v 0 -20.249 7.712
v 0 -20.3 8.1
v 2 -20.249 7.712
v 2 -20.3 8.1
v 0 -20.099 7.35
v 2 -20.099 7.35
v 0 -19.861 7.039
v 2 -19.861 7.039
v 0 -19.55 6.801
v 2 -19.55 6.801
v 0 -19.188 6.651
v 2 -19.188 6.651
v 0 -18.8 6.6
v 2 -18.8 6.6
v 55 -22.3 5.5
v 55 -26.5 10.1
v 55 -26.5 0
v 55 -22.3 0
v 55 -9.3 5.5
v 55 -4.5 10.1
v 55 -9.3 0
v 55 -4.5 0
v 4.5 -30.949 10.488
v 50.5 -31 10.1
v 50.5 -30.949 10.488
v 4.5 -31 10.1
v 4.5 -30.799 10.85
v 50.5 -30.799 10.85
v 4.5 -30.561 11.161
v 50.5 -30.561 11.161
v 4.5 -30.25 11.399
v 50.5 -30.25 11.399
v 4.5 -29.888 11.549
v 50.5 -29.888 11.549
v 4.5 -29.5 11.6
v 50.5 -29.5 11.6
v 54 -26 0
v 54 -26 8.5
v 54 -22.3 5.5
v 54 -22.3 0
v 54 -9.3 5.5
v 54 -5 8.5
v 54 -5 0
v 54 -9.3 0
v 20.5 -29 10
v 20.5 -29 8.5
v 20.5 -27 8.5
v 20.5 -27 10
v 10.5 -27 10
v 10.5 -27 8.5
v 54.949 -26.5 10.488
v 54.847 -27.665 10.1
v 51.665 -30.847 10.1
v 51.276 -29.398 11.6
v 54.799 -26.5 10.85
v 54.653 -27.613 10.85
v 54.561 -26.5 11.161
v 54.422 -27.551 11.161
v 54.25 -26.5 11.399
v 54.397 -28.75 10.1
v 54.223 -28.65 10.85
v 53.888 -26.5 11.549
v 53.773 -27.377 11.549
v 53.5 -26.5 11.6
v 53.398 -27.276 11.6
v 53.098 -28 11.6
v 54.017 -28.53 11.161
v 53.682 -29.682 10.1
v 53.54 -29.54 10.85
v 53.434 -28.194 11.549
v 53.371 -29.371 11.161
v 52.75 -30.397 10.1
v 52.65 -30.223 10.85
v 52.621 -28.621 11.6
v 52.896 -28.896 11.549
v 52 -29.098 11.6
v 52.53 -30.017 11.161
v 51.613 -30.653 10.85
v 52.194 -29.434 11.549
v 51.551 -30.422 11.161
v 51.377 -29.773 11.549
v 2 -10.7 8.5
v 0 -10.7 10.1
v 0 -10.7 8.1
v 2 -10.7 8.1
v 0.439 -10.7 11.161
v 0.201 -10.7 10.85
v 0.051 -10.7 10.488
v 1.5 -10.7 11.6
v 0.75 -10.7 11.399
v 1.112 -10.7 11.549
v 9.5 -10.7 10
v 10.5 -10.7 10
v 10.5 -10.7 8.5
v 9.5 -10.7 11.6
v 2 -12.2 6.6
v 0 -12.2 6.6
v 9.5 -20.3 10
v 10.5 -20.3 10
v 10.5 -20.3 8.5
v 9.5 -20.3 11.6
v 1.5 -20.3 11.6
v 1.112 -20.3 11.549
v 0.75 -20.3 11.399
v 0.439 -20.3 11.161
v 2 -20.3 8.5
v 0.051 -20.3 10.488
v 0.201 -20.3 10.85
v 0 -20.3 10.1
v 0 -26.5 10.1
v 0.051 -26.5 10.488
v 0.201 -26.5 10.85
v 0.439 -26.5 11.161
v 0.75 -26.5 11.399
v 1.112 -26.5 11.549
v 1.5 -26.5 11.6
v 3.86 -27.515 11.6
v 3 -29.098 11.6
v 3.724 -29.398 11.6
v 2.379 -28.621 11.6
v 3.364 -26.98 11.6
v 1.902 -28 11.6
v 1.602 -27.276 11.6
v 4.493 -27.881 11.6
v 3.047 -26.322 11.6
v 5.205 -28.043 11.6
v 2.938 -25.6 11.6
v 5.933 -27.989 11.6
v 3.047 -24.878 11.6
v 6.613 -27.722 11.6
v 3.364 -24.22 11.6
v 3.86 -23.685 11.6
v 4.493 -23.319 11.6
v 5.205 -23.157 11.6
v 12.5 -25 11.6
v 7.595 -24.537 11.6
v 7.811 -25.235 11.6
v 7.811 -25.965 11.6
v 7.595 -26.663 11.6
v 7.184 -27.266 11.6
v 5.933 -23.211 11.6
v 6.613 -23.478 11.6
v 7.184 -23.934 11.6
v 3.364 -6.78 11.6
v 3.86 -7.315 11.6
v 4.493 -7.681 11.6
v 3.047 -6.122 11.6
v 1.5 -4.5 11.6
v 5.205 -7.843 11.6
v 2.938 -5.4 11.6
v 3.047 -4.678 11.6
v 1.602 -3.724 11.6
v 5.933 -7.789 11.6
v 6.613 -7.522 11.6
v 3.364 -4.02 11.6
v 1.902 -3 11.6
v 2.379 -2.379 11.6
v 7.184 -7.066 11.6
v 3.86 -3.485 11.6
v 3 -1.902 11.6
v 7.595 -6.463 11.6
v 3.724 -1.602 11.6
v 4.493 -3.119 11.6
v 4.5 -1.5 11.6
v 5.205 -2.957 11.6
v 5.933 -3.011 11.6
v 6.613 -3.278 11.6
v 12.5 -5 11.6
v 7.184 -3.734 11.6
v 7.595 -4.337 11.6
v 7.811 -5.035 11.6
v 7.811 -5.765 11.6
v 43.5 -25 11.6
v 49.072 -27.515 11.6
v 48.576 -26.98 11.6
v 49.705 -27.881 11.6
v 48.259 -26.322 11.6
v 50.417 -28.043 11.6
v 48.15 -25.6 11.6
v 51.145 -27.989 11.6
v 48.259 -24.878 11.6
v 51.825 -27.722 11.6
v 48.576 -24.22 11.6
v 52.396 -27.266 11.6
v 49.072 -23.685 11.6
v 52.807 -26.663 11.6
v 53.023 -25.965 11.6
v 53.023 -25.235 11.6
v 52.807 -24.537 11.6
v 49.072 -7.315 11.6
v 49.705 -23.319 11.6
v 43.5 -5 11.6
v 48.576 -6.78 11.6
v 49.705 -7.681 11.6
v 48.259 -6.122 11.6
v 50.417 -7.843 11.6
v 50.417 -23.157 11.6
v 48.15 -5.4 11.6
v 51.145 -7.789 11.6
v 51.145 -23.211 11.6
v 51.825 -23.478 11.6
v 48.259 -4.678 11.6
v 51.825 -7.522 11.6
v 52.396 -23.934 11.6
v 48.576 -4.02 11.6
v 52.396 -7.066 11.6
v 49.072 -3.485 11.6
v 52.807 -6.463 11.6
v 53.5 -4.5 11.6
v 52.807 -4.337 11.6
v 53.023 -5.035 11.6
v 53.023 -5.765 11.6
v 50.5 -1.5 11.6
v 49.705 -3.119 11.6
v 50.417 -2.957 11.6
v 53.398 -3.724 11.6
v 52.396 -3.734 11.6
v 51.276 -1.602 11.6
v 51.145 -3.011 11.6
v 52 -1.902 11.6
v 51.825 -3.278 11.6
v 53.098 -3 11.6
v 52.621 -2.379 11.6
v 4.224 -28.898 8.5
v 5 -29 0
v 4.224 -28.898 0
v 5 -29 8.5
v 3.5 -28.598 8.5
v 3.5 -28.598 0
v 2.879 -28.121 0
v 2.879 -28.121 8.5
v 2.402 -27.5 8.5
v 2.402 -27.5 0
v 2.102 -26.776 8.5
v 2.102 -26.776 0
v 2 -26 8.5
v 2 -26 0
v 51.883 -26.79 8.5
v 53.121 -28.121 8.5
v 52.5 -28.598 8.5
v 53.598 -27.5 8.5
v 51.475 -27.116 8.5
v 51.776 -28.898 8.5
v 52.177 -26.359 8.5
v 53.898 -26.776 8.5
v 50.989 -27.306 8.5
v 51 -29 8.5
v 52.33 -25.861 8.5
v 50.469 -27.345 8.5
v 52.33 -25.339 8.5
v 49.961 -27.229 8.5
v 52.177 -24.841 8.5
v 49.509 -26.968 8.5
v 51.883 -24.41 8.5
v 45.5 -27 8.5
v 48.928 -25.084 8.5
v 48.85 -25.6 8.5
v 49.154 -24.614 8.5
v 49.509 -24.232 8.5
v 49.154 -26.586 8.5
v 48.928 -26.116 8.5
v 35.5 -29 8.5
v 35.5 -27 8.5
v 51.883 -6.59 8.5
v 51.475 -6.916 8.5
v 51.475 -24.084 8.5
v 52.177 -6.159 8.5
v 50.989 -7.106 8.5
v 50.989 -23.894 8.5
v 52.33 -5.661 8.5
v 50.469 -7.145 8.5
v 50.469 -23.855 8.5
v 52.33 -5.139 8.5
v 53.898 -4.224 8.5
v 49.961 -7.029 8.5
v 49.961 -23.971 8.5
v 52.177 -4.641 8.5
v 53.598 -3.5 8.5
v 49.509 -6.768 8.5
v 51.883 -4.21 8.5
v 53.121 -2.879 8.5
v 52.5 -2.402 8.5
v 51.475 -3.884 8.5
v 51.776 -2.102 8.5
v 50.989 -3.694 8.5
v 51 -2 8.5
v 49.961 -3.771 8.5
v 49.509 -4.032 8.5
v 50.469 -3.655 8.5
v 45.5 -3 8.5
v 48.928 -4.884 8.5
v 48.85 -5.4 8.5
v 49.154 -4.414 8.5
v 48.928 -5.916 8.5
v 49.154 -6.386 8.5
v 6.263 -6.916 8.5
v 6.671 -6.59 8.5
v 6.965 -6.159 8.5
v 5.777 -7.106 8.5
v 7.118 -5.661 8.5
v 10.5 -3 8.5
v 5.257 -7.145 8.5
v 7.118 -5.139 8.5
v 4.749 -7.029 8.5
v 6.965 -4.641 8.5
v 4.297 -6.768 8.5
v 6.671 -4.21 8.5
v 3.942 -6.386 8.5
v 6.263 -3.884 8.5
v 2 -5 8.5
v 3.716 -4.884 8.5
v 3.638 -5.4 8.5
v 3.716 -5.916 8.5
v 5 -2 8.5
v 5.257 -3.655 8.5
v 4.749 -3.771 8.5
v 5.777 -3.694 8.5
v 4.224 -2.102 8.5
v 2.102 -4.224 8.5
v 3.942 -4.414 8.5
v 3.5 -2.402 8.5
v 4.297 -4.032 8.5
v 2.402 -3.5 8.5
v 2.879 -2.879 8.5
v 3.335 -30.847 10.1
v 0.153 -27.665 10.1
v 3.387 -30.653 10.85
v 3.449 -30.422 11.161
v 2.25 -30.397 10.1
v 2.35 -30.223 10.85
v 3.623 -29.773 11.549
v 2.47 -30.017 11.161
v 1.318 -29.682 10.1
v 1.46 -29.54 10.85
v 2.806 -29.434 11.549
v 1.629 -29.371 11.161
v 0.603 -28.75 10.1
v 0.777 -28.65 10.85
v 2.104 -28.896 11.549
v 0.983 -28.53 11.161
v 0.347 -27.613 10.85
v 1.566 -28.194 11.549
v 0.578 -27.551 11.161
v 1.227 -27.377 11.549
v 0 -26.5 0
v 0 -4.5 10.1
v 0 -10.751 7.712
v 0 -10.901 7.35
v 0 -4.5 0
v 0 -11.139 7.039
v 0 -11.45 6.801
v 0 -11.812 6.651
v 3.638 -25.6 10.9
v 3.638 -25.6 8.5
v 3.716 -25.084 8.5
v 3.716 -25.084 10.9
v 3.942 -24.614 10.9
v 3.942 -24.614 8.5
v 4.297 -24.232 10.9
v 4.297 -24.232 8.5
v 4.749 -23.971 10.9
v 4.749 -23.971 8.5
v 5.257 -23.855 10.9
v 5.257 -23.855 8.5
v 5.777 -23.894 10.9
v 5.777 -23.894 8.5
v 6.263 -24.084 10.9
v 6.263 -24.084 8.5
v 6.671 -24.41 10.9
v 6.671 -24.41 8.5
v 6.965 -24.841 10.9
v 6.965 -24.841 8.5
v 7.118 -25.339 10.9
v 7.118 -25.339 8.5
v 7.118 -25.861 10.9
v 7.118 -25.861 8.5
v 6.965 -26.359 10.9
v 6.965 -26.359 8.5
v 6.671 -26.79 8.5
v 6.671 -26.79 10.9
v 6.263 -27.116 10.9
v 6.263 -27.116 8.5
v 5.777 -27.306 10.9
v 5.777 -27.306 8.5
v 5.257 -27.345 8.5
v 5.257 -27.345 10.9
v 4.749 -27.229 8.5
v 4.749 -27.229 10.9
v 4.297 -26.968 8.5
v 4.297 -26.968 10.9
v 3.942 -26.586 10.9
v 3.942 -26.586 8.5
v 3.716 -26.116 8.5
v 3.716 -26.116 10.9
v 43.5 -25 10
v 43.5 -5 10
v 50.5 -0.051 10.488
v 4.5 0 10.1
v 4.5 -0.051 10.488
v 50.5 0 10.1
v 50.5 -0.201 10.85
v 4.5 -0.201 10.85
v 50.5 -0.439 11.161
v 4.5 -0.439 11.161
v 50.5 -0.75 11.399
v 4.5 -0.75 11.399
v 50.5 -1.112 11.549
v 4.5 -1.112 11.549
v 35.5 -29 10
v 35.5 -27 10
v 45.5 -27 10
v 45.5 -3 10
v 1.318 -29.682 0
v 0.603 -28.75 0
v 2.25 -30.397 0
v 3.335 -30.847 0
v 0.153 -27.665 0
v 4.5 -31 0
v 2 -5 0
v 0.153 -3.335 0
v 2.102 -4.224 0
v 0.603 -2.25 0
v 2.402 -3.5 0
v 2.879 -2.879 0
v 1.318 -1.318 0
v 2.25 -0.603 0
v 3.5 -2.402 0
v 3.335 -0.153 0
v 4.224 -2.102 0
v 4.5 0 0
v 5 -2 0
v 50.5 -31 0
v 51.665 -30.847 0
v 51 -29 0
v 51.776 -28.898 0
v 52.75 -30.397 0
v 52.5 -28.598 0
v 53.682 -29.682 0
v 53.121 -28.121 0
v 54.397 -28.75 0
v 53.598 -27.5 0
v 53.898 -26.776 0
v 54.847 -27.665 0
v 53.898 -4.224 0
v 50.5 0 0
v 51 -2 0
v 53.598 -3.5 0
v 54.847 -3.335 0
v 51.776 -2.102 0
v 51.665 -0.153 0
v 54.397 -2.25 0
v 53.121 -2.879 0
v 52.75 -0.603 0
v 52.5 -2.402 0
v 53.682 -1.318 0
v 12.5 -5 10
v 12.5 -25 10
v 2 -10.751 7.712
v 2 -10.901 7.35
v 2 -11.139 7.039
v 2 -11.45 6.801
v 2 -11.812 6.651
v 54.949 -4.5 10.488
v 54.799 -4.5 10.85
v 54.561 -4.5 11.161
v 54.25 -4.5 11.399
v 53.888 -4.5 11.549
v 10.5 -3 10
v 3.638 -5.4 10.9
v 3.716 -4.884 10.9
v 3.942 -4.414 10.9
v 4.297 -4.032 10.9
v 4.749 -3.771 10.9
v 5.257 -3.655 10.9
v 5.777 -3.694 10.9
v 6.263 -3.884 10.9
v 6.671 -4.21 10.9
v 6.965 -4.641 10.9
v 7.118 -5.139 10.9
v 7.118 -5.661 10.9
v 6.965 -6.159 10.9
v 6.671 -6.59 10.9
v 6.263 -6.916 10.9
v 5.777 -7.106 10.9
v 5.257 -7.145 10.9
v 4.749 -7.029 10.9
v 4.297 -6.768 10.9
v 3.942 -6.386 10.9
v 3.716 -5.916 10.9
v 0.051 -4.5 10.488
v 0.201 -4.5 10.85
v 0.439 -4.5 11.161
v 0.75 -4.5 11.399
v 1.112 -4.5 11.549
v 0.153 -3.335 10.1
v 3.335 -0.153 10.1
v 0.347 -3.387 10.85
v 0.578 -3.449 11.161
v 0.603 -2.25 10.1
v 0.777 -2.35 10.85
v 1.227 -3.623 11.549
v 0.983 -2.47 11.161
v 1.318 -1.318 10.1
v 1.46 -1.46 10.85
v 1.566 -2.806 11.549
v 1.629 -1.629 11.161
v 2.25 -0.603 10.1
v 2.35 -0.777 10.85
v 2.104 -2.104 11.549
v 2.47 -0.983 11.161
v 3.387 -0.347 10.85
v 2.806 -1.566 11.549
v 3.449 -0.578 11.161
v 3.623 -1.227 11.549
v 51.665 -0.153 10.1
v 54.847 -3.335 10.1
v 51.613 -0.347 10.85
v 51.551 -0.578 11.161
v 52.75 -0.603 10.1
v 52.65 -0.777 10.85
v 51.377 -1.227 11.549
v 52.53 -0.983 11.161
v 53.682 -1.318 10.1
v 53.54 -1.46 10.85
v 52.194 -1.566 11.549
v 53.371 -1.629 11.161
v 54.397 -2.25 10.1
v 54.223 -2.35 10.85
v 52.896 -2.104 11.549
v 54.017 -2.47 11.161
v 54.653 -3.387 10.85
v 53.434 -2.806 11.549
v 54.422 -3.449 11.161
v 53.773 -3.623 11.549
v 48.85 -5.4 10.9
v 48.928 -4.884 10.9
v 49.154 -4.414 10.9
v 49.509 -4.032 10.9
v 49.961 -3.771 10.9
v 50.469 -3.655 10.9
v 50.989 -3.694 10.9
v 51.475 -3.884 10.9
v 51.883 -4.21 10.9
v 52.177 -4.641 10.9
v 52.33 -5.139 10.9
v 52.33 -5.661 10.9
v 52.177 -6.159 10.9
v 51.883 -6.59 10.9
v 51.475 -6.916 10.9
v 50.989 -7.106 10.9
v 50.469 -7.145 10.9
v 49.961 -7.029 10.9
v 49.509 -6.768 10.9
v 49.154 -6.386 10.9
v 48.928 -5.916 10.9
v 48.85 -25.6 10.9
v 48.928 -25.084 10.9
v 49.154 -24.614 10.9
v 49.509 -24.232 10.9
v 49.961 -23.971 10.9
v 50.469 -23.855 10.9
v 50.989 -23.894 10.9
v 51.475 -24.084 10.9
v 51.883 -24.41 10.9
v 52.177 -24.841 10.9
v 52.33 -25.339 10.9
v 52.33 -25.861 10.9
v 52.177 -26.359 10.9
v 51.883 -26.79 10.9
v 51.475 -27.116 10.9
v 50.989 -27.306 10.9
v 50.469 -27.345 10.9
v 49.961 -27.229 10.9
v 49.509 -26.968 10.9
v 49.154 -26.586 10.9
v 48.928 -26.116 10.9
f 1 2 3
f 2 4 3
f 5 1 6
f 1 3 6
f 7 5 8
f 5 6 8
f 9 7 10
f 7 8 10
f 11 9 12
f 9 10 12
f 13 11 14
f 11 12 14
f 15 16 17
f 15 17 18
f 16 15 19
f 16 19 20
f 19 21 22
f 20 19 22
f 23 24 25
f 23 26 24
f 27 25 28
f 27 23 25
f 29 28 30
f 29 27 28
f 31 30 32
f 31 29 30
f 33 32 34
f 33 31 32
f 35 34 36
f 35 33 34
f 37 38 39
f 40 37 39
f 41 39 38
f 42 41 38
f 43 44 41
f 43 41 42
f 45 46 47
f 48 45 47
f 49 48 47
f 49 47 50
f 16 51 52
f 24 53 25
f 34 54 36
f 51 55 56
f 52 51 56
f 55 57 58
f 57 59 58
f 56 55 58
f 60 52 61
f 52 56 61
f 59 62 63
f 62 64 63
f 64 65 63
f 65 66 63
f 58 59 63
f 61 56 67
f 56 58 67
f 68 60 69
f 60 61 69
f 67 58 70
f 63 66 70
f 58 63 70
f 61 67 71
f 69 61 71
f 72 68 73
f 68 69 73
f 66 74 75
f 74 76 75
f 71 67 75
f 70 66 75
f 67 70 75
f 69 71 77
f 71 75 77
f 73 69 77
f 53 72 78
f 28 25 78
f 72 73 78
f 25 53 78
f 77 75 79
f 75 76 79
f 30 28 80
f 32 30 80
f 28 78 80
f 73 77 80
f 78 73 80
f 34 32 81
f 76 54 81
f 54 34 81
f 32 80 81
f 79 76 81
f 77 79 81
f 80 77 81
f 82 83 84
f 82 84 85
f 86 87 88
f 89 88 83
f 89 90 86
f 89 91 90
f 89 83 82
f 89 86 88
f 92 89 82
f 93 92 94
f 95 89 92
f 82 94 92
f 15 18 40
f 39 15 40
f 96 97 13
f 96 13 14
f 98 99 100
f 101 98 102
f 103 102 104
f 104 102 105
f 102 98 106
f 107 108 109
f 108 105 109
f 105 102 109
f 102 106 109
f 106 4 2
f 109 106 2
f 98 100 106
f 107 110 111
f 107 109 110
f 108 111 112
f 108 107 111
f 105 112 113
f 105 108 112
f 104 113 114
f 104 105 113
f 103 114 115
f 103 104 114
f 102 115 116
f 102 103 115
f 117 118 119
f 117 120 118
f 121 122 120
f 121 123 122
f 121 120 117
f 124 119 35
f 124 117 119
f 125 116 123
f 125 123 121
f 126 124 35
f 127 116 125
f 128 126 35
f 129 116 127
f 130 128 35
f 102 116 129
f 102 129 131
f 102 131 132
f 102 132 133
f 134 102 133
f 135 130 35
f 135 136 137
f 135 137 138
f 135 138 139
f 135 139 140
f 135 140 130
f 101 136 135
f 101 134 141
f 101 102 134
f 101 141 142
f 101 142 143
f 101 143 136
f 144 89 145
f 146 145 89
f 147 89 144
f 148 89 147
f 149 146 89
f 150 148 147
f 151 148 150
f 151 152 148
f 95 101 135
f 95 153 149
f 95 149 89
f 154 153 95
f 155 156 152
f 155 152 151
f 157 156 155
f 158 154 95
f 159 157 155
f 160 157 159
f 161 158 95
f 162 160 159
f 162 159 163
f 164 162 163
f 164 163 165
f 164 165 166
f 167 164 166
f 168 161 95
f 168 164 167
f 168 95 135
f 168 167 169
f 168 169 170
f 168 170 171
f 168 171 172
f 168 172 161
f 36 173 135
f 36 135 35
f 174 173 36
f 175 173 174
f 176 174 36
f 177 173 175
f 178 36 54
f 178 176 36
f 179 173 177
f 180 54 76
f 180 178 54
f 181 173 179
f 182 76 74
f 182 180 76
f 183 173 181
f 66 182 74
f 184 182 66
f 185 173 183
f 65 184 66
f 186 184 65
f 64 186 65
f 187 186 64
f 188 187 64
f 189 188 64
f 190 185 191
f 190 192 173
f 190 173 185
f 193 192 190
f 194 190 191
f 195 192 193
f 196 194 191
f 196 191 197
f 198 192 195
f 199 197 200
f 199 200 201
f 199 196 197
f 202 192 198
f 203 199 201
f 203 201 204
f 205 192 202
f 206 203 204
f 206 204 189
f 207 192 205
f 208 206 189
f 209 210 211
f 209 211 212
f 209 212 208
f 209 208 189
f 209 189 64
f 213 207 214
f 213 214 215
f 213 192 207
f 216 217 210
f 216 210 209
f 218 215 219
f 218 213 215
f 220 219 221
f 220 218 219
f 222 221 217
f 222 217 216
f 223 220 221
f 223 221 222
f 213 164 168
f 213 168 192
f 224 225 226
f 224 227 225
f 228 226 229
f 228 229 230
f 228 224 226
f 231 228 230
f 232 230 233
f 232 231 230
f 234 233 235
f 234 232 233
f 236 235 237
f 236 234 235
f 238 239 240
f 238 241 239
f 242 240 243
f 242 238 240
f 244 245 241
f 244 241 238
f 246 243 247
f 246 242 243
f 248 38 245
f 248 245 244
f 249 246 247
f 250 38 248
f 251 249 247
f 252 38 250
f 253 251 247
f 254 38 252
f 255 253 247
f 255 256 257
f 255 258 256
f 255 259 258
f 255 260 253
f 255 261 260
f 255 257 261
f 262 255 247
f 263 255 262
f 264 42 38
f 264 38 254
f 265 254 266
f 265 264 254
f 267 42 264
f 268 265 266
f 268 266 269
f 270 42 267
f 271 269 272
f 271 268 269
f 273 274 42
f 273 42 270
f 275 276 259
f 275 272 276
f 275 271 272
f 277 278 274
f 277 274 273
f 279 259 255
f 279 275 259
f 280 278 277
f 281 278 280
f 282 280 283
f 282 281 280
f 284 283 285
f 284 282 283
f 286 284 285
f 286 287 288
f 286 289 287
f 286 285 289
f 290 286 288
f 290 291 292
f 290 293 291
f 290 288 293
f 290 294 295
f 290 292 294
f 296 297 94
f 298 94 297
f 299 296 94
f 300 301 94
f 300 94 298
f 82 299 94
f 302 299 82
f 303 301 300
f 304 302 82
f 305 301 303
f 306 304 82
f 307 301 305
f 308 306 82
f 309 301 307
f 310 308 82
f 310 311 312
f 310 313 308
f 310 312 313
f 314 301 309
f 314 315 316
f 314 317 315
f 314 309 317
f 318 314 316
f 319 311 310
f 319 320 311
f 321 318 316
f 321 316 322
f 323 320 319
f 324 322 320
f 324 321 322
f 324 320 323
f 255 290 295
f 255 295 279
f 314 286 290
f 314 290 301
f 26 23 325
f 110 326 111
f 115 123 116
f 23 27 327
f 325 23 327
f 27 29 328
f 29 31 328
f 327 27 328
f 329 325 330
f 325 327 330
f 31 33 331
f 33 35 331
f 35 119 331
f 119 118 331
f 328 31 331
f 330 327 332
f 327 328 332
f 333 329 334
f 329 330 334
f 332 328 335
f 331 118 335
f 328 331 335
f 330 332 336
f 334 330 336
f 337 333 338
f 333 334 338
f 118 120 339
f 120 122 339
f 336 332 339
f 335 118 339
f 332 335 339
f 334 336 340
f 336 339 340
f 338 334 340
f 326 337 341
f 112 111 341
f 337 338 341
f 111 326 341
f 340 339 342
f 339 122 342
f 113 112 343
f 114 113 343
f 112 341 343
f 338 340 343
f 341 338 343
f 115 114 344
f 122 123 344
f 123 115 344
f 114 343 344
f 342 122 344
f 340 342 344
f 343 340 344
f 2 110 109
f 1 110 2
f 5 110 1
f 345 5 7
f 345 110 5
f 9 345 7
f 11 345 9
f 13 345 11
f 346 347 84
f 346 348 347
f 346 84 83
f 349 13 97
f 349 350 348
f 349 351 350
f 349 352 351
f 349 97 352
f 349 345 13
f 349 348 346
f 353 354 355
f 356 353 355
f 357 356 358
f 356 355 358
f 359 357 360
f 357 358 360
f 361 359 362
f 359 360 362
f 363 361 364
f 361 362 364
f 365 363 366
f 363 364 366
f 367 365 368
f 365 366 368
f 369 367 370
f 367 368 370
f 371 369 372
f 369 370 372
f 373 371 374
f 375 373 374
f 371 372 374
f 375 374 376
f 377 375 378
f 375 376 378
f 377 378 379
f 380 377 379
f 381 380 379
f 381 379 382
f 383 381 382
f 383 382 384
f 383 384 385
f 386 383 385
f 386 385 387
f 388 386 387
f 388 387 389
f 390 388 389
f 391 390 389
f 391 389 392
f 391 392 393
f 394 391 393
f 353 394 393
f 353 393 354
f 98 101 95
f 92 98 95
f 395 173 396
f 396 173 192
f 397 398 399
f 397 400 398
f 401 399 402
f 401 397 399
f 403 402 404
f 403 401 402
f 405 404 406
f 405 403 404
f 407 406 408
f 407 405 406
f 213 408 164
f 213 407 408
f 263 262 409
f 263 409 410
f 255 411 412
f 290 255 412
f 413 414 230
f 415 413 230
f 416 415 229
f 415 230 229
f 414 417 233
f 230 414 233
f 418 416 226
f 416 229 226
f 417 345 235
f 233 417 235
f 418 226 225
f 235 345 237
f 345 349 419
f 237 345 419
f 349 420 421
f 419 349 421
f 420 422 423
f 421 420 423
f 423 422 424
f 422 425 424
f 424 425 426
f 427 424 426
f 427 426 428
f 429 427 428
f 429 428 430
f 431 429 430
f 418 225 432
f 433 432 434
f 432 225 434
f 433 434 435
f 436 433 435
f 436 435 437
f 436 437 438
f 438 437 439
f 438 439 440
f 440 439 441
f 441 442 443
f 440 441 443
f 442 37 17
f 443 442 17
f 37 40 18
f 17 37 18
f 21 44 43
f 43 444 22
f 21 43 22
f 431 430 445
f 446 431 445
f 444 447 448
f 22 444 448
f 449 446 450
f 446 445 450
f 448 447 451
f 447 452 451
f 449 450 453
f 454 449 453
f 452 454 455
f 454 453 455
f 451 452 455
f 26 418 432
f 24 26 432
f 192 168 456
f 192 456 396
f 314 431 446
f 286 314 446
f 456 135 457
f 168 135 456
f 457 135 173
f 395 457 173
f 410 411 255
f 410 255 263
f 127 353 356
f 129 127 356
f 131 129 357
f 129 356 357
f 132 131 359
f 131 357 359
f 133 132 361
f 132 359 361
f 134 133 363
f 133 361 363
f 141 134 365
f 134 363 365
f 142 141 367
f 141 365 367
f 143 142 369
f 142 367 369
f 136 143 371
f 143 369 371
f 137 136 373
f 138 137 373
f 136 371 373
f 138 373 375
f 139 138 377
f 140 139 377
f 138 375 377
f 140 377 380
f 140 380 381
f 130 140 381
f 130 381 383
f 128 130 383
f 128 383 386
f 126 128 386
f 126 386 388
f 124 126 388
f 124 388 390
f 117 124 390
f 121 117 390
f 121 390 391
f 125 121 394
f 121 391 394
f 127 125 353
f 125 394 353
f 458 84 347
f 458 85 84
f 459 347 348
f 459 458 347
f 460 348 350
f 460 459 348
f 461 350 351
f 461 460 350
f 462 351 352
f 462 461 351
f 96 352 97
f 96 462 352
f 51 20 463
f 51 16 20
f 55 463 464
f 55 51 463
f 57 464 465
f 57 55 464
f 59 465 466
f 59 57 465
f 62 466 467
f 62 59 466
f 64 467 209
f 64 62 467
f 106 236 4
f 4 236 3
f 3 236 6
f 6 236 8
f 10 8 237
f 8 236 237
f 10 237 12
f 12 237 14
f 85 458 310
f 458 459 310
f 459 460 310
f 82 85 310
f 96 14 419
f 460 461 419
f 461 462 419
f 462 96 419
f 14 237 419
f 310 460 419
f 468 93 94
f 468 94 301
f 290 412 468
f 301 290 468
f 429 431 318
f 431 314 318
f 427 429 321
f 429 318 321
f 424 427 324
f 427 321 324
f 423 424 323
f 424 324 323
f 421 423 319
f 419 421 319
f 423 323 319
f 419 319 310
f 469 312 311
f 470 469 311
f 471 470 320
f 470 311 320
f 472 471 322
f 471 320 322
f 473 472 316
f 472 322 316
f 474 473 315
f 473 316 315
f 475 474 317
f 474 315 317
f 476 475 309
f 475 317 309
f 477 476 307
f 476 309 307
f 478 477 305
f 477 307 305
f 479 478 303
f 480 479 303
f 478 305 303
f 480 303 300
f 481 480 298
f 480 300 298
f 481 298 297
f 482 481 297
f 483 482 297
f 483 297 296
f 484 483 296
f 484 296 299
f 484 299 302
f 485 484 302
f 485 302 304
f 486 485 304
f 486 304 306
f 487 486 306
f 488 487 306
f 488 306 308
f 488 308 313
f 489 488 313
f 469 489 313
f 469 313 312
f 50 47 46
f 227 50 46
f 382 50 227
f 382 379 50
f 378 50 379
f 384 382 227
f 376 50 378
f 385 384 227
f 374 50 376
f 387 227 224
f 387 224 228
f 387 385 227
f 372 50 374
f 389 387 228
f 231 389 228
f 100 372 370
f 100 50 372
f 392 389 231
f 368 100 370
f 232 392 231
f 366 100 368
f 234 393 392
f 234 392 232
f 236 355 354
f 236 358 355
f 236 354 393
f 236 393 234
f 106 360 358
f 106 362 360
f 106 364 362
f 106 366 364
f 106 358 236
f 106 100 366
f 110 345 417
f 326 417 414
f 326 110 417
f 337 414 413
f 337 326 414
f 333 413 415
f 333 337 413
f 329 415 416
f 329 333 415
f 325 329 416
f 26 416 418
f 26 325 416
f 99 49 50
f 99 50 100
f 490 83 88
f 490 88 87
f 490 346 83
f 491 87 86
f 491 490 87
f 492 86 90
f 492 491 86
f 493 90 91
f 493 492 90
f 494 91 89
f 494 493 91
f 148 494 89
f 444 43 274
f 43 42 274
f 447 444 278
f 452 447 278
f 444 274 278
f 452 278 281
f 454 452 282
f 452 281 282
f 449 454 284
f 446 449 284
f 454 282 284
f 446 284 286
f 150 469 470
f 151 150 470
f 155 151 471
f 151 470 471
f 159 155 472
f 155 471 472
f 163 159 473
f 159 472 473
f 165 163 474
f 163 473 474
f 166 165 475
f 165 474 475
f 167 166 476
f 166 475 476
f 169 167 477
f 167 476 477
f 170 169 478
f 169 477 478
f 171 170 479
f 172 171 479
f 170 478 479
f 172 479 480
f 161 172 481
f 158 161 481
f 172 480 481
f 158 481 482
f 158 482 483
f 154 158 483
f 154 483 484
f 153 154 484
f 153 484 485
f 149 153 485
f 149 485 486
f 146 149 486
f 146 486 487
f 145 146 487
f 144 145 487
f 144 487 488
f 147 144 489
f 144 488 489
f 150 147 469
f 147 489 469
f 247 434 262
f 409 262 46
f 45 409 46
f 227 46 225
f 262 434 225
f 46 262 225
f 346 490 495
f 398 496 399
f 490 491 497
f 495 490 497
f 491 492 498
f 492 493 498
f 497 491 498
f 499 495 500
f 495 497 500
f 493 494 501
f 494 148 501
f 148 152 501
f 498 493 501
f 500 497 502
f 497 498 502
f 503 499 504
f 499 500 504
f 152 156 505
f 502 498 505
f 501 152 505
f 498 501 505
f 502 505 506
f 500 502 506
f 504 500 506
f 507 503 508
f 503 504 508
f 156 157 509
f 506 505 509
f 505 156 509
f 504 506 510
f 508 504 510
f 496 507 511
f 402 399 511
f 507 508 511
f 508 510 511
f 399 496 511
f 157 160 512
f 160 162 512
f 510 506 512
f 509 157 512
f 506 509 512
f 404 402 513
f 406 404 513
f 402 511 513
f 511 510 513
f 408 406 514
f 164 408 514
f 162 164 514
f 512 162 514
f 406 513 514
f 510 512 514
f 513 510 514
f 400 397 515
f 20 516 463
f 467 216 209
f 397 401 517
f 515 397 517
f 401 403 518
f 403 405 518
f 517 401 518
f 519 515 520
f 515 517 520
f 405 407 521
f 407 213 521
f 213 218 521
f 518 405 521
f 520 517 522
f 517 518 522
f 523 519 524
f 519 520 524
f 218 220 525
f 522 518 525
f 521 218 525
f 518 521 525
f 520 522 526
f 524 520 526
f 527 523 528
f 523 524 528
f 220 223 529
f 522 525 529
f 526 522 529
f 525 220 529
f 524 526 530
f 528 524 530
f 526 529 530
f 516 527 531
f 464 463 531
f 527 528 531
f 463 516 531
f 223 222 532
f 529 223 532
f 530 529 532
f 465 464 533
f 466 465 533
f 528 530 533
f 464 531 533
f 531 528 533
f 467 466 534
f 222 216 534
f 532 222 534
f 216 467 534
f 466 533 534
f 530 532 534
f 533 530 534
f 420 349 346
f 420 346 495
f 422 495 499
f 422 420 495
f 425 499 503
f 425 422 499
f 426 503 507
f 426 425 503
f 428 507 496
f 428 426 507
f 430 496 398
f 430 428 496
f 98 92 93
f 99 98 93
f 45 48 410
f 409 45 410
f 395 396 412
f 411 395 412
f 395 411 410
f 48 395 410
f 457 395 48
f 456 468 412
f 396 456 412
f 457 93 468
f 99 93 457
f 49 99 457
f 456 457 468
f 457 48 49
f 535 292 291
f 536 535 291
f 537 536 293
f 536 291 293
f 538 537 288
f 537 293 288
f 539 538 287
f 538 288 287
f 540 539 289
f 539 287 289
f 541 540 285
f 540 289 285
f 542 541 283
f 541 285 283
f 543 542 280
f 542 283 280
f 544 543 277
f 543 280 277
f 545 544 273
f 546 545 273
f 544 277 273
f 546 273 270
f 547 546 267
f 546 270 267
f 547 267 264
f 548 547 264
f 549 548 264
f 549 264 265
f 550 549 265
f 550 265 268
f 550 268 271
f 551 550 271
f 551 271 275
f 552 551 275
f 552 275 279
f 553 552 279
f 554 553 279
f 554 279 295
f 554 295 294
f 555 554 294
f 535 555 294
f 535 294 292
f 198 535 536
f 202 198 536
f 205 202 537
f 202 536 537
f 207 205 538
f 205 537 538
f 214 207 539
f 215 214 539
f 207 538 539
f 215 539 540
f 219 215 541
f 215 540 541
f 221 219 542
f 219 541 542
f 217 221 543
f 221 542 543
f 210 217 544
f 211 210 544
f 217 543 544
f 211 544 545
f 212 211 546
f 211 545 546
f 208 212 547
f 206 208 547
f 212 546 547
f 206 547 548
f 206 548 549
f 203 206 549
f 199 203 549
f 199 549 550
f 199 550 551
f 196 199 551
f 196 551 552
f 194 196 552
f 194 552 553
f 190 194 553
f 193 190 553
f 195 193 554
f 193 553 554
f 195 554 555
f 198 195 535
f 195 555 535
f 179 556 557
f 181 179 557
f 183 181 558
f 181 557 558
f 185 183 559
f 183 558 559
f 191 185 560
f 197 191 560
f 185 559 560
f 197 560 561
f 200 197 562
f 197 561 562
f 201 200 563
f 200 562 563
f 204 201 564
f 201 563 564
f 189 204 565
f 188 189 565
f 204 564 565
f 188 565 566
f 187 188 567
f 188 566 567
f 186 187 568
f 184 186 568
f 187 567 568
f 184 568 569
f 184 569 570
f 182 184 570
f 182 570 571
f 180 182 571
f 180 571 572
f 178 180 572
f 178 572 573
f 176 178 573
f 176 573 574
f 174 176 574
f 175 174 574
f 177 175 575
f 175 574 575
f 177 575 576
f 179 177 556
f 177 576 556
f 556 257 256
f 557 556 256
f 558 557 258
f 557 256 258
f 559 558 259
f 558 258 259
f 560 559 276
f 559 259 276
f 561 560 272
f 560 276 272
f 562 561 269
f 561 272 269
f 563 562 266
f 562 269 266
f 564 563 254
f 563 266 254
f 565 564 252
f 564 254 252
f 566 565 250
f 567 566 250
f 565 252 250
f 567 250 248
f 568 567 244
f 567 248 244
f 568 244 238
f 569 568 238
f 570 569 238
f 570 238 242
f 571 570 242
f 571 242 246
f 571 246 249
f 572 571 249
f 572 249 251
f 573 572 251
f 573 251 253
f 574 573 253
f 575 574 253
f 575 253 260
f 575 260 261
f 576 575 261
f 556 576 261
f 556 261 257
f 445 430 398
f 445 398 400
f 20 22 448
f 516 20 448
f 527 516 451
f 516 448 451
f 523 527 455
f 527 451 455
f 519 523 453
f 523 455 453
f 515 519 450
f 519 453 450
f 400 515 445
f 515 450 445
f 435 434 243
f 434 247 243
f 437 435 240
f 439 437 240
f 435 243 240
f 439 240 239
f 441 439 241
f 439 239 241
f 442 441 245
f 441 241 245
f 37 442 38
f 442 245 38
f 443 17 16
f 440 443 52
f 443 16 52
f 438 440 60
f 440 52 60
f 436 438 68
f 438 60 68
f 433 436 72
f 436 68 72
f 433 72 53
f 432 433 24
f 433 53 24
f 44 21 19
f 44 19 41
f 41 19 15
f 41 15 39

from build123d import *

# Parameters (mm, degrees)
SKETCH_1_W          = 55
SKETCH_1_H          = 31
SKETCH_1_W_2        = 52
SKETCH_1_H_2        = 27
EXTRUDE_1_DEPTH     = 10
SKETCH_2_W          = 55
SKETCH_2_H          = 31
EXTRUDE_2_DEPTH     = 1.6
CUT_EXTRUDE_1_REACH = 66.192
SKETCH_3_W          = 31
SKETCH_3_H          = 20
SKETCH_4_W          = 52
SKETCH_4_H          = 27
SKETCH_4_W_2        = 35
SKETCH_4_H_2        = 24
EXTRUDE_3_DEPTH     = 1.5
SKETCH_5_W          = 15
SKETCH_5_H          = 2
CUT_EXTRUDE_2_DEPTH = 1.5
SKETCH_7_W          = 9.5
SKETCH_7_H          = 9.6
CUT_EXTRUDE_4_DEPTH = 5
SKETCH_8_W          = 1
SKETCH_8_H          = 9.6
CUT_EXTRUDE_5_DEPTH = 1.5
SKETCH_9_W          = 1
SKETCH_9_H          = 13
CUT_EXTRUDE_6_DEPTH = 5.5
SKETCH_10_R         = 1.75
CUT_EXTRUDE_7_DEPTH = 64.704395453
FILLET_1_R          = 3
FILLET_2_R          = 4.5
FILLET_3_R          = 1.5
FILLET_4_R          = 1.5
CHAMFER_1_SIZE      = 0.7


with BuildPart() as part:
    # 草图1 → 凸台-拉伸1 (new body)
    with BuildSketch(Plane.XY):
        with Locations((27.5, -15.5)):
            Rectangle(SKETCH_1_W, SKETCH_1_H)
        with Locations((28, -15.5)):
            Rectangle(SKETCH_1_W_2, SKETCH_1_H_2, mode=Mode.SUBTRACT)
    extrude(amount=EXTRUDE_1_DEPTH)

    # 草图2 → 凸台-拉伸2 (add)
    with BuildSketch(Plane.XY.offset(10)):
        with Locations((27.5, -15.5)):
            Rectangle(SKETCH_2_W, SKETCH_2_H)
    extrude(amount=EXTRUDE_2_DEPTH)

    # 草图3 → 切除-拉伸1 (cut, up to next)
    with BuildSketch(Plane.XY.offset(11.6), mode=Mode.PRIVATE) as cut_extrude_1_sk1:
        with Locations((28, -15)):
            Rectangle(SKETCH_3_W, SKETCH_3_H)
    cut_extrude_1_tool1 = extrude(cut_extrude_1_sk1.sketch, amount=-CUT_EXTRUDE_1_REACH, mode=Mode.PRIVATE) & part.part
    add(cut_extrude_1_tool1.solids().sort_by_distance((28, -15, 11.6))[0], mode=Mode.SUBTRACT)

    # 草图4 → 凸台-拉伸3 (add)
    with BuildSketch(Plane(origin=(0, 0, 10), x_dir=(-1, 0, 0), z_dir=(0, 0, -1))):
        with Locations((-28, -15.5)):
            Rectangle(SKETCH_4_W, SKETCH_4_H)
        with Locations((-28, -15)):
            Rectangle(SKETCH_4_W_2, SKETCH_4_H_2, mode=Mode.SUBTRACT)
    extrude(amount=EXTRUDE_3_DEPTH)

    # 草图5 → 切除-拉伸2 (cut)
    with BuildSketch(Plane(origin=(0, 0, 8.5), x_dir=(-1, 0, 0), z_dir=(0, 0, -1))):
        with Locations((-28, -28)):
            Rectangle(SKETCH_5_W, SKETCH_5_H)
    extrude(amount=-CUT_EXTRUDE_2_DEPTH, mode=Mode.SUBTRACT)

    # 草图7 → 切除-拉伸4 (cut)
    with BuildSketch(Plane.XY.offset(11.6)):
        with Locations((4.75, -15.5)):
            Rectangle(SKETCH_7_W, SKETCH_7_H)
    extrude(amount=-CUT_EXTRUDE_4_DEPTH, mode=Mode.SUBTRACT)

    # 草图8 → 切除-拉伸5 (cut)
    with BuildSketch(Plane(origin=(0, 0, 8.5), x_dir=(-1, 0, 0), z_dir=(0, 0, -1))):
        with Locations((-10, -15.5)):
            Rectangle(SKETCH_8_W, SKETCH_8_H)
    extrude(amount=-CUT_EXTRUDE_5_DEPTH, mode=Mode.SUBTRACT)

    # 草图9 → 切除-拉伸6 (cut)
    with BuildSketch(Plane(origin=(0, 0, 0), x_dir=(-1, 0, 0), z_dir=(0, 0, -1))):
        with Locations((-54.5, -15.8)):
            Rectangle(SKETCH_9_W, SKETCH_9_H)
    extrude(amount=-CUT_EXTRUDE_6_DEPTH, mode=Mode.SUBTRACT)

    # 草图10 → 切除-拉伸7 (cut, through all)
    with BuildSketch(Plane(origin=(0, 0, 8.5), x_dir=(-1, 0, 0), z_dir=(0, 0, -1))):
        with Locations((-50.6, -5.4)):
            Circle(SKETCH_10_R)
        with Locations((-5.388, -5.4)):
            Circle(SKETCH_10_R)
        with Locations((-5.388, -25.6)):
            Circle(SKETCH_10_R)
        with Locations((-50.6, -25.6)):
            Circle(SKETCH_10_R)
    extrude(amount=-CUT_EXTRUDE_7_DEPTH, mode=Mode.SUBTRACT)

    # 圆角1
    fillet_1_edges = [part.edges().sort_by_distance(p)[0] for p in [
        (54, -2, 4.25),
        (2, -2, 4.25),
        (54, -29, 4.25),
        (2, -29, 4.25),
    ]]
    fillet(fillet_1_edges, radius=FILLET_1_R)

    # 圆角2
    fillet_2_edges = [part.edges().sort_by_distance(p)[0] for p in [
        (0, 0, 5.8),
        (55, 0, 5.8),
        (55, -31, 5.8),
        (0, -31, 5.8),
    ]]
    fillet(fillet_2_edges, radius=FILLET_2_R)

    # 圆角3
    fillet_3_edges = [part.edges().sort_by_distance(p)[0] for p in [
        (1, -10.7, 6.6),
        (1, -20.3, 6.6),
    ]]
    fillet(fillet_3_edges, radius=FILLET_3_R)

    # 圆角4
    fillet_4_edges = [part.edges().sort_by_distance(p)[0] for p in [
        (0, -7.6, 11.6),
        (27.5, 0, 11.6),
        (27.5, -31, 11.6),
        (55, -15.5, 11.6),
        (53.681980515, -1.318019485, 11.6),
        (53.681980515, -29.681980515, 11.6),
        (1.318019485, -29.681980515, 11.6),
        (1.318019485, -1.318019485, 11.6),
        (0, -23.4, 11.6),
    ]]
    fillet(fillet_4_edges, radius=FILLET_4_R)

    # 倒角1
    chamfer_1_edges = [part.edges().sort_by_distance(p)[0] for p in [
        (52.35, -25.6, 11.6),
        (7.138, -25.6, 11.6),
        (7.138, -5.4, 11.6),
        (52.35, -5.4, 11.6),
    ]]
    chamfer(chamfer_1_edges, length=CHAMFER_1_SIZE)


solid = part.part
